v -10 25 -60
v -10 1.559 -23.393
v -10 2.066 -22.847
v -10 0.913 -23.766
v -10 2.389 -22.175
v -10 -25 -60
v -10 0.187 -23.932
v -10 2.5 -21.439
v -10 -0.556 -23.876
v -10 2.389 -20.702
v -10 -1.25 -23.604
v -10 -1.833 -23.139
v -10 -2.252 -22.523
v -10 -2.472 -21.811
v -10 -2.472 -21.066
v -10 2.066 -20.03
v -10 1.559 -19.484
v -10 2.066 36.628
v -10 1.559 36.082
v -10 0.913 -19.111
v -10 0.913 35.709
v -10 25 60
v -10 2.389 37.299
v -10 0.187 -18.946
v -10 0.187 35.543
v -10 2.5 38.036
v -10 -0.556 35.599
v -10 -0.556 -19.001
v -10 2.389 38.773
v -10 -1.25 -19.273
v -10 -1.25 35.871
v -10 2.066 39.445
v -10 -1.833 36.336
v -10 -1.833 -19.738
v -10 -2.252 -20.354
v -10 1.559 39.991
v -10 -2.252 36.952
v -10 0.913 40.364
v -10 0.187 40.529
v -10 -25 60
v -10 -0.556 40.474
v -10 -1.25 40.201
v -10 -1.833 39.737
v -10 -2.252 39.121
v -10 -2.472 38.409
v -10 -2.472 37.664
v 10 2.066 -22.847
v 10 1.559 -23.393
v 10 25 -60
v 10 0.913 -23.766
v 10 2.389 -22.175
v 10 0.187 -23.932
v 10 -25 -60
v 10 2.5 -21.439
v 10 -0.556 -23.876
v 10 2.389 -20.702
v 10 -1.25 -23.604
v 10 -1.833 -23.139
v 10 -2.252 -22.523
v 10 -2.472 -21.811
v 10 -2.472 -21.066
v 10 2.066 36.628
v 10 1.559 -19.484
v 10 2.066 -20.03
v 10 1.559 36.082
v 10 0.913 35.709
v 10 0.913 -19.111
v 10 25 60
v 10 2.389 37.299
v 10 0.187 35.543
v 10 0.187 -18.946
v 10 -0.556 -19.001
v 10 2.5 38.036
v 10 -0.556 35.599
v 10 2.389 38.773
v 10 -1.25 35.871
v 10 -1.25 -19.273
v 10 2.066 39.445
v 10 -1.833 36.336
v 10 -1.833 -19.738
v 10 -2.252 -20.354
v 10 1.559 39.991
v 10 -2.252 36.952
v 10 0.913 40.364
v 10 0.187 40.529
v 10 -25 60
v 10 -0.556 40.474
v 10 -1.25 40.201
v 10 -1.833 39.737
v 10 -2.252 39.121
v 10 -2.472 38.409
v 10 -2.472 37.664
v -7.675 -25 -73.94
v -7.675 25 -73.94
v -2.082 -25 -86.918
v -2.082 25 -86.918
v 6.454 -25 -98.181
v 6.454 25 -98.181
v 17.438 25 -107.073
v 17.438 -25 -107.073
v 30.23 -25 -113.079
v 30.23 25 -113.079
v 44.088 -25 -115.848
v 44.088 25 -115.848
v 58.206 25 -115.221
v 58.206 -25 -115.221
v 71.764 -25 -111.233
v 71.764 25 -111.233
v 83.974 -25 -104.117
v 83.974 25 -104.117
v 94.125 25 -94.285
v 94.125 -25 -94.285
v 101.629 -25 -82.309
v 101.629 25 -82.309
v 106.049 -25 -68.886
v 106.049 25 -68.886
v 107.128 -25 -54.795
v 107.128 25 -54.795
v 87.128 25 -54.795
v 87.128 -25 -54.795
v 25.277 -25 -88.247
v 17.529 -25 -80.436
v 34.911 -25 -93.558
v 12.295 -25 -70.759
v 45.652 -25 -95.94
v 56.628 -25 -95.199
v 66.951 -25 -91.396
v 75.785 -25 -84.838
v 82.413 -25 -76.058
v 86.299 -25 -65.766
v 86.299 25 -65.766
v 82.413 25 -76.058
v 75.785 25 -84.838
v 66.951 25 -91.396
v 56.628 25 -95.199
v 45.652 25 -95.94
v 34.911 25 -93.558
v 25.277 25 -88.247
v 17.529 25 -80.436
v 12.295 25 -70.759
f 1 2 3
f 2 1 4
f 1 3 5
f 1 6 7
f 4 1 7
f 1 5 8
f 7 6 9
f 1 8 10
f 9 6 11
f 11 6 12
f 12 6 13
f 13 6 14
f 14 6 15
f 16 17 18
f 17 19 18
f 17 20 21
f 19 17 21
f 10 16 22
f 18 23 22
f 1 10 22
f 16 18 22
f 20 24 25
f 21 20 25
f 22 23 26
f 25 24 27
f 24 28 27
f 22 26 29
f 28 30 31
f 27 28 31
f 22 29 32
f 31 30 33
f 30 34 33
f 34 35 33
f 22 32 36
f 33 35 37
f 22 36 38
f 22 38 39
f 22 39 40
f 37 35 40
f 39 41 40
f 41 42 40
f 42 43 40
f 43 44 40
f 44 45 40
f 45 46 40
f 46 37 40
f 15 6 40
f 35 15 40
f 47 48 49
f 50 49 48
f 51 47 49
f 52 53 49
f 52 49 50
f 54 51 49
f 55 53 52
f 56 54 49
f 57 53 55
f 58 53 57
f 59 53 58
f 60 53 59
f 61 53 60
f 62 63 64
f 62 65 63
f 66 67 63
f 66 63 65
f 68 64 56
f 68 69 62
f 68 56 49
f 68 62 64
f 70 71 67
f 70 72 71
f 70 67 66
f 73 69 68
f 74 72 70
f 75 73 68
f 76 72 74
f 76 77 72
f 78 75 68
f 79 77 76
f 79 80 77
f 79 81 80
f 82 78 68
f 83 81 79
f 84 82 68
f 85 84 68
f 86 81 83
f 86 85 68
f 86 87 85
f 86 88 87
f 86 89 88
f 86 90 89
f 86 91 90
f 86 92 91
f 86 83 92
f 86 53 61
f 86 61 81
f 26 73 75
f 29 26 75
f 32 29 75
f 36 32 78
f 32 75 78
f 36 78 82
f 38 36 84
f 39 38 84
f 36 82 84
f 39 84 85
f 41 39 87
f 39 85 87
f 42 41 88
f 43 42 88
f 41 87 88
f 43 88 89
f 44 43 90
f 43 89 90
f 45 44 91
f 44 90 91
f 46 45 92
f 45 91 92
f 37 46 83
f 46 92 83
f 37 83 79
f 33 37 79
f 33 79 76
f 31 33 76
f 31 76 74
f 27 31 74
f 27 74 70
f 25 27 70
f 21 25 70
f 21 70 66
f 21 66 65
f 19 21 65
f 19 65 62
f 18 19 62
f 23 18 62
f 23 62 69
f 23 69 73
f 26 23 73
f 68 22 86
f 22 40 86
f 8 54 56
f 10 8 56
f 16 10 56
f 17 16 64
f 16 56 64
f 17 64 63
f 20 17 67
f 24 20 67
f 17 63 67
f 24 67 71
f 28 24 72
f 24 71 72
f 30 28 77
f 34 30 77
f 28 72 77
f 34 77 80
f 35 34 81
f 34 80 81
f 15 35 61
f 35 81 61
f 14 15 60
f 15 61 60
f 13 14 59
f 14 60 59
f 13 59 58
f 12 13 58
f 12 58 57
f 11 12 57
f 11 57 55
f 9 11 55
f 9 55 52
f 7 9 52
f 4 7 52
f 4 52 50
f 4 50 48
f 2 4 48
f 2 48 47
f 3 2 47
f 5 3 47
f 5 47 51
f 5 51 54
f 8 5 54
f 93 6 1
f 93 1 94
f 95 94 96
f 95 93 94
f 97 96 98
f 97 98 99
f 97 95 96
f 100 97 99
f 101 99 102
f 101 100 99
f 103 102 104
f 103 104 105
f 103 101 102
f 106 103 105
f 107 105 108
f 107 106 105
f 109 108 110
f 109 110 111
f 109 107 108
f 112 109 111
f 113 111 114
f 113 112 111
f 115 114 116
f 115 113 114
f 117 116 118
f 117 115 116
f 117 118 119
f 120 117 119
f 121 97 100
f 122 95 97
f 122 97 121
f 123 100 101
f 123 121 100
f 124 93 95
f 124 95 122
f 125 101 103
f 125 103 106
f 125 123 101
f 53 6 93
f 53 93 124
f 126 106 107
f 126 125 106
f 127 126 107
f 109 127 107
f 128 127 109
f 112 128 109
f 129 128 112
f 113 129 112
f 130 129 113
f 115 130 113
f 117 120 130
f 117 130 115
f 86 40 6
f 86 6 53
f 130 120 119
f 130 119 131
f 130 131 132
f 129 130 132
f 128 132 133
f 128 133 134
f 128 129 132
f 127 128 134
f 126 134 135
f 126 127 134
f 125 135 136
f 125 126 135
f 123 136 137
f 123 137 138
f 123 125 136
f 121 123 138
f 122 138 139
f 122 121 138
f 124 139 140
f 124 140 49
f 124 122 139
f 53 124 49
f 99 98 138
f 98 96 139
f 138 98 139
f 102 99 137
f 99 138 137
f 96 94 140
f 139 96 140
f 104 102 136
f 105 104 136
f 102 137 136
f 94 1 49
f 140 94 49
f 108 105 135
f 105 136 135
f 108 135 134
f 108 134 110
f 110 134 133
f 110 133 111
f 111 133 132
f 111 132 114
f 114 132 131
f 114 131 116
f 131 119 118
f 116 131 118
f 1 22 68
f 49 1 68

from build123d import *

# Parameters (mm, degrees)
F0_W     = 20
F0_H     = 120
F1_DEPTH = 25
F2_R     = 2.5
F3_DEPTH = 20.001


with BuildPart() as f1:
    # F0 (on Front) → F1 (new body, symmetric)
    with BuildSketch(Plane.XZ):
        Rectangle(F0_W, F0_H)
        with BuildLine():
            ThreePointArc((87.128021, -54.795358), (51.166331, -95.96169), (10, -60))
            Line((10, -60), (-10, -60))
            ThreePointArc((-10, -60), (51.166331, -115.96169), (107.128021, -54.795358))
            Line((107.128021, -54.795358), (87.128021, -54.795358))
        make_face()
    extrude(amount=F1_DEPTH, both=True)

    # F2 (on face) → F3 (cut, through all)
    with BuildSketch(Plane.YZ.offset(10)):
        with Locations((0, -21.438537)):
            Circle(F2_R)
        with Locations((0, 38.03635)):
            Circle(F2_R)
    extrude(amount=-F3_DEPTH, mode=Mode.SUBTRACT)


solid = f1.part
